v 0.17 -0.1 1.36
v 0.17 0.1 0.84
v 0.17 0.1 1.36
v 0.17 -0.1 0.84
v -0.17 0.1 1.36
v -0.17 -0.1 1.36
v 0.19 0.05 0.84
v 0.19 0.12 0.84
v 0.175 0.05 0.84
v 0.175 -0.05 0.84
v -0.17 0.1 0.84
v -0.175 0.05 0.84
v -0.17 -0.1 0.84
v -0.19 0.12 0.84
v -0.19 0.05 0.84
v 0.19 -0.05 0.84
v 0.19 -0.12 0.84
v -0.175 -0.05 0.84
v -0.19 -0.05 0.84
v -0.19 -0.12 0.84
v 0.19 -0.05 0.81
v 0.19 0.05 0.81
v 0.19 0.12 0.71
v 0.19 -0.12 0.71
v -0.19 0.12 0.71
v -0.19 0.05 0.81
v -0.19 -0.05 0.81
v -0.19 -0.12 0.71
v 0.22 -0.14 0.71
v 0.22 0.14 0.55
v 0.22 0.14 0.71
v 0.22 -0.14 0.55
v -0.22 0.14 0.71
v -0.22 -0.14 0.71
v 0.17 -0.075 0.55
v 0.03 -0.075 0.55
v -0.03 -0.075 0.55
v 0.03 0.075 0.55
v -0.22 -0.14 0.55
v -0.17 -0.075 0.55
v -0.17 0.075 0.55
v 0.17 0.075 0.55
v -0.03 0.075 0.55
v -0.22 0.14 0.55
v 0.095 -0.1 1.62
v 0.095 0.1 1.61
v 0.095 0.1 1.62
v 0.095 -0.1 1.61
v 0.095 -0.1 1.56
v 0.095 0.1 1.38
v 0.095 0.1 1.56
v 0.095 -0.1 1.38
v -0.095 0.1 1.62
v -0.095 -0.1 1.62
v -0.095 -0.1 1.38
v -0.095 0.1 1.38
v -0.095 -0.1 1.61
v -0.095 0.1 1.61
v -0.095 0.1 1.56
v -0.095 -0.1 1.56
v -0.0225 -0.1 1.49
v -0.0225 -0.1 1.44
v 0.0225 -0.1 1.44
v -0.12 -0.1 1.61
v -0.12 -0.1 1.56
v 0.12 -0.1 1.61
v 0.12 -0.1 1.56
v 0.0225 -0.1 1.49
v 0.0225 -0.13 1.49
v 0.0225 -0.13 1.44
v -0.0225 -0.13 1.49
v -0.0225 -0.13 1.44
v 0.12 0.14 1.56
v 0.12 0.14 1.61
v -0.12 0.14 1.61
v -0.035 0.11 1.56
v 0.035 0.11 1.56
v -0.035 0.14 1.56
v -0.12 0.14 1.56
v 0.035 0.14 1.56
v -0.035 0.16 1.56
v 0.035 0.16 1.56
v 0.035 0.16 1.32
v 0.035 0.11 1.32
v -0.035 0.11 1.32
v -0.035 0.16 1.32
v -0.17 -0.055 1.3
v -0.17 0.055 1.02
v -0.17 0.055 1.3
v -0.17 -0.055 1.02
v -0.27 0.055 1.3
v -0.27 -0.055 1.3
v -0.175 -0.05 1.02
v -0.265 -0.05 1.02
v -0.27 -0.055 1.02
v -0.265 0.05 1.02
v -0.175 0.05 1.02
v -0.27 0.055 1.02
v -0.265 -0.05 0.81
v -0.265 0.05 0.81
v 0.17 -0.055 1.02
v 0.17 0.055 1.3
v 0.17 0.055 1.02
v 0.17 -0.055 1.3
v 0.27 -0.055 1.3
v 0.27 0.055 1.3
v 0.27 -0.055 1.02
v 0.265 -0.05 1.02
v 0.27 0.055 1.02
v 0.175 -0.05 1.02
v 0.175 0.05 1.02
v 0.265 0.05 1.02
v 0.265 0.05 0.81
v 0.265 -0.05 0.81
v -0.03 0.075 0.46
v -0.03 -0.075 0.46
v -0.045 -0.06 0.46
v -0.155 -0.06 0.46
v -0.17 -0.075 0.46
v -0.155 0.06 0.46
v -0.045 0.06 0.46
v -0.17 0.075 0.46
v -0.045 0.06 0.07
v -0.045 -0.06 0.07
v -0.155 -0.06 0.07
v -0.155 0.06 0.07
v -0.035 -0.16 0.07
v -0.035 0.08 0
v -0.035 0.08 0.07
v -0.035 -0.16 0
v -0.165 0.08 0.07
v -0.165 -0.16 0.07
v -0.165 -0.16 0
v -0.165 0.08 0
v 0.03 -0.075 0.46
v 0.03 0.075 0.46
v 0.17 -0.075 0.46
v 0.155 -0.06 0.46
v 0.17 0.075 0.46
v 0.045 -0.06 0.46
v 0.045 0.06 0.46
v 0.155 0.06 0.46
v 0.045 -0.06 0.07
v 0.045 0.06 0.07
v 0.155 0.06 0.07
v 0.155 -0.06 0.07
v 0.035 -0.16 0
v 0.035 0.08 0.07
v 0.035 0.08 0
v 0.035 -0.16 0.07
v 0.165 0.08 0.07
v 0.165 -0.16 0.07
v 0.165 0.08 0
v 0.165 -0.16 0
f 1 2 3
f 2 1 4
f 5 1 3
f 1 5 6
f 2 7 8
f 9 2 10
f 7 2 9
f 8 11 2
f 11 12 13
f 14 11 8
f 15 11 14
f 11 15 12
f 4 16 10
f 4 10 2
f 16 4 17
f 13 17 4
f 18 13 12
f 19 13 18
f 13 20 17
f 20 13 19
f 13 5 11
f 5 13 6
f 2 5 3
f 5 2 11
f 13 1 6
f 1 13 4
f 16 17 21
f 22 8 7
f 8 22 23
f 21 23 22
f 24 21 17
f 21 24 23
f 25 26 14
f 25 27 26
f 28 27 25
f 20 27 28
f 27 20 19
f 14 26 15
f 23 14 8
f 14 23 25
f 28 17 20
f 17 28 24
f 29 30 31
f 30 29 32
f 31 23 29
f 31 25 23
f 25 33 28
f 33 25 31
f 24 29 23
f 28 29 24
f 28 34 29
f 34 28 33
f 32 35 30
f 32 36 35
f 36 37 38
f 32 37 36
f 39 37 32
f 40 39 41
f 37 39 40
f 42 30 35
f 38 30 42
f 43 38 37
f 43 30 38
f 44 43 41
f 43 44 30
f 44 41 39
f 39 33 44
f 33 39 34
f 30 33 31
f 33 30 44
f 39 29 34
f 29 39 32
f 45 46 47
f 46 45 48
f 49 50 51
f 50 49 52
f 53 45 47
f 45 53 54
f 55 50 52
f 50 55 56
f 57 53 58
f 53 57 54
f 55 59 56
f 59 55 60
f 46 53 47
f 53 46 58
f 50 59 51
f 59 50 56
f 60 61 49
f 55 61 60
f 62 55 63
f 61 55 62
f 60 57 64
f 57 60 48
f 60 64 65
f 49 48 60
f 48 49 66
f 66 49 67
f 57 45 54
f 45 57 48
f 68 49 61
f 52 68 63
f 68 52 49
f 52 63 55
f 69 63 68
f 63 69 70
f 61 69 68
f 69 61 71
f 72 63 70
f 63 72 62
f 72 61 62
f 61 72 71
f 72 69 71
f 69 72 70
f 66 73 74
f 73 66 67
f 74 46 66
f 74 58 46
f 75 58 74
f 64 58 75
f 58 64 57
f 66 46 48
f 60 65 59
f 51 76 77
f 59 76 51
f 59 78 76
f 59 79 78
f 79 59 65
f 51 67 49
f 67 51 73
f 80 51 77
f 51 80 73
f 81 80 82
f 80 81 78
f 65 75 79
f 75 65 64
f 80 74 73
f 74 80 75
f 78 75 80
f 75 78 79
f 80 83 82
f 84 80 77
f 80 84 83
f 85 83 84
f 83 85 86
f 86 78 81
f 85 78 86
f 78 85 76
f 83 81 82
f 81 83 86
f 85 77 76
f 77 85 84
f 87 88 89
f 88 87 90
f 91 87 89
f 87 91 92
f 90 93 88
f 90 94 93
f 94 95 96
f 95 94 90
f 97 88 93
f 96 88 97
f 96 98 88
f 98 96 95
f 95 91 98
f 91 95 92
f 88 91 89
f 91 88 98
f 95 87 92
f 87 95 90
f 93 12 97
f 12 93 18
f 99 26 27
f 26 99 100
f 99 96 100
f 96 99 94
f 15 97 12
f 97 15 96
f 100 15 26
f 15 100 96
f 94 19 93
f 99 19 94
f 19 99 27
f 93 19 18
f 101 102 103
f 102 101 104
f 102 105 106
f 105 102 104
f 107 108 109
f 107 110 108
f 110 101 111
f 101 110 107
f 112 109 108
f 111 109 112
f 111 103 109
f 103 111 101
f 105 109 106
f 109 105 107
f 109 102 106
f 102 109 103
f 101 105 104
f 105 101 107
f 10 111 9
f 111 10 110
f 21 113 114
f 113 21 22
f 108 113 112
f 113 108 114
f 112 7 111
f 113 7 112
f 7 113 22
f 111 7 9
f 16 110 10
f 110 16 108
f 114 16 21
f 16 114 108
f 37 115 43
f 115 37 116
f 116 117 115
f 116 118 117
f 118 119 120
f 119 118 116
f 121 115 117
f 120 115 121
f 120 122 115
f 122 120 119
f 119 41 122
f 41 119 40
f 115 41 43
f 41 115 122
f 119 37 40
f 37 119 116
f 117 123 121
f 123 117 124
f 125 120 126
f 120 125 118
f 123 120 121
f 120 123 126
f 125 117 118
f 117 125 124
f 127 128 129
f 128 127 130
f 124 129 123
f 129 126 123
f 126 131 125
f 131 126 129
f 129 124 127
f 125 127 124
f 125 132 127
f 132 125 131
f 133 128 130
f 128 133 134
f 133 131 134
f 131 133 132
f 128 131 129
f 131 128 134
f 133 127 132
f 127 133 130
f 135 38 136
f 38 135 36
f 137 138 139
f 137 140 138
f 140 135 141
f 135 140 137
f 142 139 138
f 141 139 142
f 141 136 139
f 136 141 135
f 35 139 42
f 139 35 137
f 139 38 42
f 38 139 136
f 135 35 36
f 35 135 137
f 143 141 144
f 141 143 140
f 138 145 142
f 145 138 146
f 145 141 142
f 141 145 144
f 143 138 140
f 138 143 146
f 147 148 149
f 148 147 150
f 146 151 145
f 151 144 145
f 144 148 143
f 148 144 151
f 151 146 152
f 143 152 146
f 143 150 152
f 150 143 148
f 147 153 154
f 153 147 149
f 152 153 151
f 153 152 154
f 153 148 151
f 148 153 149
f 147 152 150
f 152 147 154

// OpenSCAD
// ============================================================================
// citizen.scad - 连衣裙市民（kit_char 组装角色范例，新剪影：马尾 + 裙摆）
//
// ScadRig 契约同 agent_basic：1 unit = 1 m，Z-up，root 原点落地，面朝 -Y。
// 部件全部来自 assets/scad/lib/kit_char.scad；ch_TINT() 纯品红 = 运行时换色
// 占位（连衣裙 + 袖子）。
// ============================================================================

use <../lib/kit_char.scad>

$fn = 8;

module bone_head()
{
    ch_head_slim();
    ch_hair_ponytail(ch_HAIRC(2));
}

module bone_arm_l() { ch_arm_shirt(ch_TINT()); }
module bone_arm_r() { mirror([1, 0, 0]) ch_arm_shirt(ch_TINT()); }

module bone_leg_l() { ch_leg_shorts([0.85, 0.83, 0.80]); }
module bone_leg_r() { mirror([1, 0, 0]) ch_leg_shorts([0.85, 0.83, 0.80]); }

module bone_torso()
{
    ch_torso_dress(ch_TINT());
    translate(ch_pivot_head())  bone_head();
    translate(ch_pivot_arm_l()) bone_arm_l();
    translate(ch_pivot_arm_r()) bone_arm_r();
}

module bone_root()
{
    translate(ch_pivot_torso()) bone_torso();
    translate(ch_pivot_leg_l()) bone_leg_l();
    translate(ch_pivot_leg_r()) bone_leg_r();
}

bone_root();

// ---- 动画 clips（库函数） ----

anim_idle = ch_clip_idle();
anim_walk = ch_clip_walk();
anim_sit  = ch_clip_sit();
anim_work = ch_clip_work();
anim_wave = ch_clip_wave();
